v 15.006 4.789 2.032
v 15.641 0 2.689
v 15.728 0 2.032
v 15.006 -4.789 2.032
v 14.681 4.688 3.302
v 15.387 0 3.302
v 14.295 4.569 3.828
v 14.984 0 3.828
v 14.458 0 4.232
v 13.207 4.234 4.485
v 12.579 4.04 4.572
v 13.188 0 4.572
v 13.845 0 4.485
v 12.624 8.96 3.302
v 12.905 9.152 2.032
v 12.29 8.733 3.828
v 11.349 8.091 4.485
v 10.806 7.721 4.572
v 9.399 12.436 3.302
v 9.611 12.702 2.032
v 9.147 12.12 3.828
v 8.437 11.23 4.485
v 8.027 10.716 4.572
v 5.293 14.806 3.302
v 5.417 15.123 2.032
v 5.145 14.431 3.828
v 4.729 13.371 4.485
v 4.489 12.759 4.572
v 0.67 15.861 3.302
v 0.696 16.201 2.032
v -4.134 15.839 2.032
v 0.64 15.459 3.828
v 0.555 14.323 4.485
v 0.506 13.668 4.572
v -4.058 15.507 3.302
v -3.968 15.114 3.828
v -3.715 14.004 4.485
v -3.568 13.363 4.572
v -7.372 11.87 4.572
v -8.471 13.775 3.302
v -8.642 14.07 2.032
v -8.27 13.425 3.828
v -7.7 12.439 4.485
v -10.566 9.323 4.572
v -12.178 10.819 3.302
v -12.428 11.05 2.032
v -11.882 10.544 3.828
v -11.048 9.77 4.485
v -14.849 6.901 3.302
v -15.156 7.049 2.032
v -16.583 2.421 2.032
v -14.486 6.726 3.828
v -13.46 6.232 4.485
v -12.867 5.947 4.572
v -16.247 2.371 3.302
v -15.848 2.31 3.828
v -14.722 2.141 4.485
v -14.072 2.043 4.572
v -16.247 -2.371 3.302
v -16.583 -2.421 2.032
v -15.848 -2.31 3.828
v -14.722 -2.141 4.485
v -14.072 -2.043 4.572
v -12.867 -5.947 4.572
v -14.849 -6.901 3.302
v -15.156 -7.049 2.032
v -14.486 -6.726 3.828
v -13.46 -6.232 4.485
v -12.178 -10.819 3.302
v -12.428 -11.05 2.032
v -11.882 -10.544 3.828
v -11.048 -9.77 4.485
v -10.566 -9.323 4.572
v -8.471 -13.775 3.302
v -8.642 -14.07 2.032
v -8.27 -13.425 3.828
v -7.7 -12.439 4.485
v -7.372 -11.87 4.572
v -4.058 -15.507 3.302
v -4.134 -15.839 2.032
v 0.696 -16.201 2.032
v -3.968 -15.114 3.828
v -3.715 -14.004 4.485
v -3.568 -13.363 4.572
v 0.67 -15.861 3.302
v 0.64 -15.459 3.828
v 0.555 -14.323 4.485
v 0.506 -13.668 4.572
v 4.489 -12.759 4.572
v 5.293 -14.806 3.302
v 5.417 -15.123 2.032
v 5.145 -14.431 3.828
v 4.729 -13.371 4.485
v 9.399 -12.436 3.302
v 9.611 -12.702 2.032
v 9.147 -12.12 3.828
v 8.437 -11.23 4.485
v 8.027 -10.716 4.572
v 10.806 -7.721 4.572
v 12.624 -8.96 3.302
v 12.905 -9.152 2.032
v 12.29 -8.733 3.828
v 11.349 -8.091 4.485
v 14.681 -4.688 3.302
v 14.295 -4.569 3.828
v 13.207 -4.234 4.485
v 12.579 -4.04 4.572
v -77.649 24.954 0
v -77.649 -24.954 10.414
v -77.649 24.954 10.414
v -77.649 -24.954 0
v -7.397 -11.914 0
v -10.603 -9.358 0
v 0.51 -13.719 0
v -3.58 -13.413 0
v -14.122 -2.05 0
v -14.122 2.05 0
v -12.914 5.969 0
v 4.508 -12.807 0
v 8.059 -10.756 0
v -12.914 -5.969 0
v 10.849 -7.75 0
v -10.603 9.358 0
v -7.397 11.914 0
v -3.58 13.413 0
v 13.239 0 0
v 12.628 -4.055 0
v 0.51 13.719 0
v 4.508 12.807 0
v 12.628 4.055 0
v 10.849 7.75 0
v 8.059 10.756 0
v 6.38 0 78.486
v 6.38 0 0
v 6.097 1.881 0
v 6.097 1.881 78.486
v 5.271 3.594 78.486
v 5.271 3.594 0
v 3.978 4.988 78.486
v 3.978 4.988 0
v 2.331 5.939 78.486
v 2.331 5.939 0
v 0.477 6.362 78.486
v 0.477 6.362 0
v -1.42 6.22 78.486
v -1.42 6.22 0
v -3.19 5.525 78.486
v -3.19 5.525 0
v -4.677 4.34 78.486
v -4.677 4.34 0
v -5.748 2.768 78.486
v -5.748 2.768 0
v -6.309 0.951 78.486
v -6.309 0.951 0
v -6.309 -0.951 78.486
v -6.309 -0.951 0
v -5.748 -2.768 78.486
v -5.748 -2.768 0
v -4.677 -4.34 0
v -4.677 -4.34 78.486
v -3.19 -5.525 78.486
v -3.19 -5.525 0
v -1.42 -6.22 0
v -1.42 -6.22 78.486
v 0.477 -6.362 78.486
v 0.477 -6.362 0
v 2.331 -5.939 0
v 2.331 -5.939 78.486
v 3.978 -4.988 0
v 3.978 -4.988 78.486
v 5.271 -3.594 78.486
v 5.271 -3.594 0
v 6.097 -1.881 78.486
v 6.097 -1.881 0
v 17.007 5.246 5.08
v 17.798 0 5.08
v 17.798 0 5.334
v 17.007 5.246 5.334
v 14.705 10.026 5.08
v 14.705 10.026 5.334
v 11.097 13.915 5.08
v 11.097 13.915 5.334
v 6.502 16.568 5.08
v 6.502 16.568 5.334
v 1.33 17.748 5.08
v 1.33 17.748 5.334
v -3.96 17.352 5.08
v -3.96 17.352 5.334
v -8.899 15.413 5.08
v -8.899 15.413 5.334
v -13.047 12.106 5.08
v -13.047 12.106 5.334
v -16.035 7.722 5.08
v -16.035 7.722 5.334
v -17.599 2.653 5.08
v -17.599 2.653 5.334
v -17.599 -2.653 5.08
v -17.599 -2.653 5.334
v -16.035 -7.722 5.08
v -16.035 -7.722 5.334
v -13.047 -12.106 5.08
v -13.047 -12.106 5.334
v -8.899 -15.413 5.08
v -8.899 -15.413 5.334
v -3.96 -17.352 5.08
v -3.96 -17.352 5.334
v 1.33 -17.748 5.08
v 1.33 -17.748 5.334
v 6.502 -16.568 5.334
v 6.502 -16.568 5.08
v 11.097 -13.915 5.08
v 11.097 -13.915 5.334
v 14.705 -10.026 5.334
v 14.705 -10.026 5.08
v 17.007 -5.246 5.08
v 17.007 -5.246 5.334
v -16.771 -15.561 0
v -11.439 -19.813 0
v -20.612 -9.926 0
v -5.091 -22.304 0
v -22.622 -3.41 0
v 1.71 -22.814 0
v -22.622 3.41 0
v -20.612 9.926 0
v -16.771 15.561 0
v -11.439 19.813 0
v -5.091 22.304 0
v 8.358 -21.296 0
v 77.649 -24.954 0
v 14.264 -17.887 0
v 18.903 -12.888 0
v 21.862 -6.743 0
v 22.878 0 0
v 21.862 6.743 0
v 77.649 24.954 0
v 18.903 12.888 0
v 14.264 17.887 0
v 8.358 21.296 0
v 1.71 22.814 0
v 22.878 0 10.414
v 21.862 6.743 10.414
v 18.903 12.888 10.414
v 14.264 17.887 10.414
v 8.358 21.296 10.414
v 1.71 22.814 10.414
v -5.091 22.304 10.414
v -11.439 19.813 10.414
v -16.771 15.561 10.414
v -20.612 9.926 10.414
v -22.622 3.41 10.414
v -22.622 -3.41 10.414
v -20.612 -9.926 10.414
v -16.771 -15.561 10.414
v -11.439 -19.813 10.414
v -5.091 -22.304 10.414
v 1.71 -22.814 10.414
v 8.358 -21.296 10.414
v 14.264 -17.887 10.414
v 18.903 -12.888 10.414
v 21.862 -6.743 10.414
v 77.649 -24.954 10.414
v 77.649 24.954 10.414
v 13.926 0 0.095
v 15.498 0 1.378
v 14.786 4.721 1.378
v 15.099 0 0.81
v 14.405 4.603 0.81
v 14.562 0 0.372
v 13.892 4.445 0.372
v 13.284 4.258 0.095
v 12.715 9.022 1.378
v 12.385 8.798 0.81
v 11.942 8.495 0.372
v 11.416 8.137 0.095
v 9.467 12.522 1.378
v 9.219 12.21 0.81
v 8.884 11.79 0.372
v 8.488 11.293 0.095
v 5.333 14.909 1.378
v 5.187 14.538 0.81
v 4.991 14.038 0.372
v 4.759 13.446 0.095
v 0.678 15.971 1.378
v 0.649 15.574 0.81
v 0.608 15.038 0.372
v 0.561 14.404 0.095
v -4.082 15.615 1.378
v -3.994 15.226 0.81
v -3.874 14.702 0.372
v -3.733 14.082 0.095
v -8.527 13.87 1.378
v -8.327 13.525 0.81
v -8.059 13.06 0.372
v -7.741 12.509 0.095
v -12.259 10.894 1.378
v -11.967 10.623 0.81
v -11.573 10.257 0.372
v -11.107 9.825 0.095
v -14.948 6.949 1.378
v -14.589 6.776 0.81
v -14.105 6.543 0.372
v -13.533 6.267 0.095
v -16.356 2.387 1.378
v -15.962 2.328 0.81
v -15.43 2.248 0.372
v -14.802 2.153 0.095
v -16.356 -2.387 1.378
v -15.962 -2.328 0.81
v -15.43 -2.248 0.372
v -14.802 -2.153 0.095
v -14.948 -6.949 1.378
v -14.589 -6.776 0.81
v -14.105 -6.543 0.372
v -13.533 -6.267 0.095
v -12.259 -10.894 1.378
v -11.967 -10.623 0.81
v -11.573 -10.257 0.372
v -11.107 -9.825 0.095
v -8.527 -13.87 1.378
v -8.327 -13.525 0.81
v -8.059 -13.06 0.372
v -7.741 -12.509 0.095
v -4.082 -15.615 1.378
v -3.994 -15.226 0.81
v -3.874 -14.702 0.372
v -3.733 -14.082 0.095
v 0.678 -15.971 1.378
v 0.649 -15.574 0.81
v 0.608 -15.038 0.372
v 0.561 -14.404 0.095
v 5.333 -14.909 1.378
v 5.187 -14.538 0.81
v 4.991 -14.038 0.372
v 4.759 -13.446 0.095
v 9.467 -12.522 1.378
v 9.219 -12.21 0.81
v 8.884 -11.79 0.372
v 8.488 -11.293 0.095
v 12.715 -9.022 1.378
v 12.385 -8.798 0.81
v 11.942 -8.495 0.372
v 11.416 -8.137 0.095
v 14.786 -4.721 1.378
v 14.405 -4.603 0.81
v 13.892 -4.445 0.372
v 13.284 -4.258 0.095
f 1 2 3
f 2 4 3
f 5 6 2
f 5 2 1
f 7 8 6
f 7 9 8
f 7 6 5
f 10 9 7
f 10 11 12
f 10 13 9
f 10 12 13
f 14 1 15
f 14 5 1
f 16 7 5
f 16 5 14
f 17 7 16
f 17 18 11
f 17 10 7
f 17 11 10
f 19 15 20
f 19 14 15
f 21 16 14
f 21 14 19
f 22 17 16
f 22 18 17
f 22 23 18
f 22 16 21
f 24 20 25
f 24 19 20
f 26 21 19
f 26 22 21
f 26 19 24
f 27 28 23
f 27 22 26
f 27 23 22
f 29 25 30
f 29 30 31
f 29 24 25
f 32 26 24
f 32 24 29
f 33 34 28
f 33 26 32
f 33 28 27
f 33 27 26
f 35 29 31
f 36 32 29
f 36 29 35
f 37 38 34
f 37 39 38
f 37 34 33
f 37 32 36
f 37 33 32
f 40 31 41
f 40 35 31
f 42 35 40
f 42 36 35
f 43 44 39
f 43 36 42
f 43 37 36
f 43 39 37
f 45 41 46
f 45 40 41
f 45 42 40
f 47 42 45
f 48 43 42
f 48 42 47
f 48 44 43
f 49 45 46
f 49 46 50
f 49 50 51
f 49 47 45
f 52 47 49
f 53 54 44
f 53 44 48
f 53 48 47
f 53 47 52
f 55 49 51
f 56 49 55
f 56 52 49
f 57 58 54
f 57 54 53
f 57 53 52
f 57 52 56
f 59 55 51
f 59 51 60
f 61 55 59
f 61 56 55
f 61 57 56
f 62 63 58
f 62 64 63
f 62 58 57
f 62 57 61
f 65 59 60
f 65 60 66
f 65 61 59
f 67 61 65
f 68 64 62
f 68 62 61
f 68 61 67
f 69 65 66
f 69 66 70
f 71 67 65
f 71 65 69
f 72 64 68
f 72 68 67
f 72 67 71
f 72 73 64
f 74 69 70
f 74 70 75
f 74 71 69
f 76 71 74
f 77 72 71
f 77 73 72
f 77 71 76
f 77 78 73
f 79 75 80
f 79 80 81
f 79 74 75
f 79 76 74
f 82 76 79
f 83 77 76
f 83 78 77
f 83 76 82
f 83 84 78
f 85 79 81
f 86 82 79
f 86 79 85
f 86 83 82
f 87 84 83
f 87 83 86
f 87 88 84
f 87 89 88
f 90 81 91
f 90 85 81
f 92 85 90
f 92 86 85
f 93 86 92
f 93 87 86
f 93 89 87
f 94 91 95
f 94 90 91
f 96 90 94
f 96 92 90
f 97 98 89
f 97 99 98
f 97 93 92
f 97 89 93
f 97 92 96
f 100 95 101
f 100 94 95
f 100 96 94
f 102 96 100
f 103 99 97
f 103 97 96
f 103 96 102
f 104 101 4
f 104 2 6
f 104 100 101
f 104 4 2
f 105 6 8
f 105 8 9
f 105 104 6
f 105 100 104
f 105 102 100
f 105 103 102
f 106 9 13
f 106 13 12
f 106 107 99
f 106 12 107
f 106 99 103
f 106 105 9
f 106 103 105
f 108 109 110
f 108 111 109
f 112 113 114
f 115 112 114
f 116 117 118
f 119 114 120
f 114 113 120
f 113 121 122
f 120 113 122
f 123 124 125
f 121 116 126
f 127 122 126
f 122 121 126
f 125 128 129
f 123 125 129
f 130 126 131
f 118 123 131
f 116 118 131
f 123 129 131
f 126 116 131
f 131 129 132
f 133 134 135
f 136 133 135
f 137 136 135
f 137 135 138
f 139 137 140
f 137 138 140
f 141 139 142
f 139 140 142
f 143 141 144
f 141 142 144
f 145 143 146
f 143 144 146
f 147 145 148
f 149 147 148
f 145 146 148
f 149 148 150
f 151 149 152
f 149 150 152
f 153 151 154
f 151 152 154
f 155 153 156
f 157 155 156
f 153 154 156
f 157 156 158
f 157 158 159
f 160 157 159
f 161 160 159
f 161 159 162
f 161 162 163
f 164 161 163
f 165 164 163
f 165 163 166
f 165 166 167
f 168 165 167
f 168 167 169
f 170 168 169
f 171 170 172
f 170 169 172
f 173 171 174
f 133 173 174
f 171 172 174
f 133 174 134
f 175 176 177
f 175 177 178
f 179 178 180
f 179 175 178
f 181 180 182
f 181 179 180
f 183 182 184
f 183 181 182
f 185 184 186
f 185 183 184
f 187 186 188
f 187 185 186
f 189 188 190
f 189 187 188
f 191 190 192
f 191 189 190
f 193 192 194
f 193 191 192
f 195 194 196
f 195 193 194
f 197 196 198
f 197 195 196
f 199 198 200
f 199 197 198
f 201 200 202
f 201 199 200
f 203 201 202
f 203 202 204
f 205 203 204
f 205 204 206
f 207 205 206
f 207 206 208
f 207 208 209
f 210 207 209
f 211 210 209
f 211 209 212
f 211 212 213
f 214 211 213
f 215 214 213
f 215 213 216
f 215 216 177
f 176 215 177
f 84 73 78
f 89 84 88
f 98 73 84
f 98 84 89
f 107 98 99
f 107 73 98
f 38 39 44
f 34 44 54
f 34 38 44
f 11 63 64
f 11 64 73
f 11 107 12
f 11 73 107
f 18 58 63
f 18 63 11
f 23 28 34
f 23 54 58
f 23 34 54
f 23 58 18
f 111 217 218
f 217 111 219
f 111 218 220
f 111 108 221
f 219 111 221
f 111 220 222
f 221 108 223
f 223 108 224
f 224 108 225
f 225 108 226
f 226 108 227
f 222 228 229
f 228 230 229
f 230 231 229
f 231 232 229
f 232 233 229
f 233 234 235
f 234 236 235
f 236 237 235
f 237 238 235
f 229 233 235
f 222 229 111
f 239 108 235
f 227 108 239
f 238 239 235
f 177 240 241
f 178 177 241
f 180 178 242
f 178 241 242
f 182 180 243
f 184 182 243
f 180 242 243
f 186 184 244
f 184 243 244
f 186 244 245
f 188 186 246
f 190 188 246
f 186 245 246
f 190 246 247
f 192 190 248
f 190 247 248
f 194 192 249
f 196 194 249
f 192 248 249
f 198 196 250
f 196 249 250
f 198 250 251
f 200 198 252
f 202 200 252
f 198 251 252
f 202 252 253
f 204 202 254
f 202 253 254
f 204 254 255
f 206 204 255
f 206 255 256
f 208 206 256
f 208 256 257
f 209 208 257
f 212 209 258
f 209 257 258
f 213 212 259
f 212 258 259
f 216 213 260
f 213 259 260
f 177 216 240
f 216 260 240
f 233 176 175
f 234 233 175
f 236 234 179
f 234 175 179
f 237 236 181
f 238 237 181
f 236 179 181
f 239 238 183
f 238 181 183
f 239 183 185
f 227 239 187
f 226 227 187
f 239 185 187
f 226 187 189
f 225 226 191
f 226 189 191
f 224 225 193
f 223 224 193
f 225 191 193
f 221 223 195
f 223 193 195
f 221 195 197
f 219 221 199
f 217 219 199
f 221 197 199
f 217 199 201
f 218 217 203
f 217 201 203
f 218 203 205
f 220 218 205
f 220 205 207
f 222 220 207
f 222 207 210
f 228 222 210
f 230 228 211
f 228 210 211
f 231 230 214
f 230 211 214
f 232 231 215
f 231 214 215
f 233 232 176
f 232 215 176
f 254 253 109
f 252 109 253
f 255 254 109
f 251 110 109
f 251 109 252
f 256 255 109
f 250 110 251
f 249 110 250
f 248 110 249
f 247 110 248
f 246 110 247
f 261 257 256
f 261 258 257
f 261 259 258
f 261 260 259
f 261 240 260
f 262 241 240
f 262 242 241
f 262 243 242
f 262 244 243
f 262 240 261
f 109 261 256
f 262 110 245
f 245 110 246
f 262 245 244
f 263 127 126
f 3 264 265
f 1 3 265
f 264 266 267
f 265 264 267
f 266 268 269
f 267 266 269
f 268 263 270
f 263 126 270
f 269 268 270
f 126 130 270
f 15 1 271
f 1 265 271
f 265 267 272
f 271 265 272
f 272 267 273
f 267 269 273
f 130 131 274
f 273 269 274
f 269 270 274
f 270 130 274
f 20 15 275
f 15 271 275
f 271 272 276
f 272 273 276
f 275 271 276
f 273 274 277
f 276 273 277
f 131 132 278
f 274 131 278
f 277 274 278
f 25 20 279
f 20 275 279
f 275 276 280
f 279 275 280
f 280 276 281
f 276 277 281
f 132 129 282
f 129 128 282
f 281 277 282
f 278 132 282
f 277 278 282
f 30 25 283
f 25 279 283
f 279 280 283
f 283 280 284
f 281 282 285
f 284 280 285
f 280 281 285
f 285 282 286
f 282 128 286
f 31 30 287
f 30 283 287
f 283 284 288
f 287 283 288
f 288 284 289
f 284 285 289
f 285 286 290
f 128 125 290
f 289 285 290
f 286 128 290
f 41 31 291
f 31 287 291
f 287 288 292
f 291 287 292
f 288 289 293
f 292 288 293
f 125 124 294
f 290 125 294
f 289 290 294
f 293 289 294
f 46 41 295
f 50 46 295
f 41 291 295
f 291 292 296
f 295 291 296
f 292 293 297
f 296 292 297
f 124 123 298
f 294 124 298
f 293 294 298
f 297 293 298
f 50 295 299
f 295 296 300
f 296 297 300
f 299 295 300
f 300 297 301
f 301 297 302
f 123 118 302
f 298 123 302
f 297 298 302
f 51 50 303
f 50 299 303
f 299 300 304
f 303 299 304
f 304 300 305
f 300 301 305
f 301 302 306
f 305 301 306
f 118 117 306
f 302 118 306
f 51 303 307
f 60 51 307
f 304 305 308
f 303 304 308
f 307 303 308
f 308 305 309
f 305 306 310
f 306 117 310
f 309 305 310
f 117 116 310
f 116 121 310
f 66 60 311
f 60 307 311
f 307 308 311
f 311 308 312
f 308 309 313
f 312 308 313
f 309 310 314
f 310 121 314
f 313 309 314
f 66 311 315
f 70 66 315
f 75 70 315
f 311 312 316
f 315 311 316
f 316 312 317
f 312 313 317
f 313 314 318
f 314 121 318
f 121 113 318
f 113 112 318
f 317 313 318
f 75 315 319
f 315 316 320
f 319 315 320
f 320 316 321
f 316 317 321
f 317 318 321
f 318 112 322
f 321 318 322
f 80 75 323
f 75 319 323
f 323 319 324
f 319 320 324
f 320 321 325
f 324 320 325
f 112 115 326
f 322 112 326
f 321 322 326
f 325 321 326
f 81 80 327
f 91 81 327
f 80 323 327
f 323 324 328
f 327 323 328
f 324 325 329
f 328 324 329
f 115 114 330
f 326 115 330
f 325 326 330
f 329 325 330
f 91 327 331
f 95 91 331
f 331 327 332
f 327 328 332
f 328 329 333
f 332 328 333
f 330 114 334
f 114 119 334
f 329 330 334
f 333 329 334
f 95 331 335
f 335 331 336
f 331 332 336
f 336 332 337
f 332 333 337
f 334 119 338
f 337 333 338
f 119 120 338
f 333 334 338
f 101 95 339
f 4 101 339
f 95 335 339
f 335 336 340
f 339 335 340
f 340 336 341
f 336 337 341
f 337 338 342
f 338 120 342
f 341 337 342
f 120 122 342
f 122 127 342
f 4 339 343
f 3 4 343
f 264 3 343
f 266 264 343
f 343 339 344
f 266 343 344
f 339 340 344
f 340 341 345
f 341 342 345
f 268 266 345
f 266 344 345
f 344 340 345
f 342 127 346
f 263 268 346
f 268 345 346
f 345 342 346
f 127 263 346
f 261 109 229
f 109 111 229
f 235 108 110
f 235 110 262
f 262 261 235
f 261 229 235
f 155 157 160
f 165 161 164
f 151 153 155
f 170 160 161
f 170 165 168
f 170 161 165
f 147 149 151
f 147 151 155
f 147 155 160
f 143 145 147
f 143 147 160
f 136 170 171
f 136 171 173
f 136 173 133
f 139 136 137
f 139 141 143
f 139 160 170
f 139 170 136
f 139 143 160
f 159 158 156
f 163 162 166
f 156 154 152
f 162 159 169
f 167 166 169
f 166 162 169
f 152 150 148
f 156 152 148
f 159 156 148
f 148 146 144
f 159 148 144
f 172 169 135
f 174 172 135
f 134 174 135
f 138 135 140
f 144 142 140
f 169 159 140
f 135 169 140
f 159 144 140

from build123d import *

# Parameters (mm, degrees)
F0_W     = 155.297530815
F0_H     = 49.9070994556
F0_R     = 17.7979211921
F1_DEPTH = 4.572
F2_W     = 155.297530815
F2_H     = 49.9070994556
F2_R     = 17.7979211921
F3_DEPTH = 5.842
F4_R     = 16.2462540438
F5_DEPTH = 4.572
F6_R     = 2.54
F8_R     = 6.3800715249
F9_DEPTH = 78.486
F10_SIZE = 5.08
F11_SIZE = 5.08


# Not quite as in the source:
# - a fillet or chamfer that OpenCascade refuses, or shapes differently, is made with other operations: its cross-section is extruded or revolved along the edge and cut away or added


with BuildPart() as f1:
    # F0 (on Top) → F1 (new body)
    with BuildSketch(Plane.XY):
        Rectangle(F0_W, F0_H)
        Circle(F0_R, mode=Mode.SUBTRACT)
    extrude(amount=F1_DEPTH)

    # F2 (on face) → F3 (join)
    with BuildSketch(Plane.XY.offset(4.572)):
        Rectangle(F2_W, F2_H)
        Circle(F2_R, mode=Mode.SUBTRACT)
    extrude(amount=F3_DEPTH)

    # F10
    f10_edges = [f1.edges().sort_by_distance(p)[0] for p in [
        (-17.797921, 0, 0),
    ]]
    chamfer(f10_edges, length=F10_SIZE)

    # F11
    f11_edges = [f1.edges().sort_by_distance(p)[0] for p in [
        (-17.797921, 0, 10.414),
    ]]
    chamfer(f11_edges, length=F11_SIZE)


with BuildPart() as f5:
    # F4 (on Top) → F5 (new body)
    with BuildSketch(Plane.XY):
        with Locations((-0.5184755428, 0)):
            Circle(F4_R)
    extrude(amount=F5_DEPTH)

    # F6
    f6_edges = [f5.edges().sort_by_distance(p)[0] for p in [
        (-16.76473, 0, 4.572),
    ]]
    fillet(f6_edges, radius=F6_R)

    # F7: fillet of radius 2.54 on 1 edges, made by hand

    # F7_s1 → F7_t2 (revolve, cut)
    with BuildSketch(Plane.XZ):
        with BuildLine():
            ThreePointArc((15.7277785011, 2.032), (14.8455339738, 0.5725244601), (13.2390969224, 0))
            Line((13.2390969224, 0), (15.7277785011, 0))
            Line((15.7277785011, 0), (15.7277785011, 2.032))
        make_face()
    revolve(axis=Axis((-0.5184755428, 0, 0), (0, 0, 1)), mode=Mode.SUBTRACT)


with BuildPart() as f9:
    # F8 (on Top) → F9 (new body)
    with BuildSketch(Plane.XY):
        Circle(F8_R)
    extrude(amount=F9_DEPTH)


solid = Compound([f1.part, f5.part, f9.part])
